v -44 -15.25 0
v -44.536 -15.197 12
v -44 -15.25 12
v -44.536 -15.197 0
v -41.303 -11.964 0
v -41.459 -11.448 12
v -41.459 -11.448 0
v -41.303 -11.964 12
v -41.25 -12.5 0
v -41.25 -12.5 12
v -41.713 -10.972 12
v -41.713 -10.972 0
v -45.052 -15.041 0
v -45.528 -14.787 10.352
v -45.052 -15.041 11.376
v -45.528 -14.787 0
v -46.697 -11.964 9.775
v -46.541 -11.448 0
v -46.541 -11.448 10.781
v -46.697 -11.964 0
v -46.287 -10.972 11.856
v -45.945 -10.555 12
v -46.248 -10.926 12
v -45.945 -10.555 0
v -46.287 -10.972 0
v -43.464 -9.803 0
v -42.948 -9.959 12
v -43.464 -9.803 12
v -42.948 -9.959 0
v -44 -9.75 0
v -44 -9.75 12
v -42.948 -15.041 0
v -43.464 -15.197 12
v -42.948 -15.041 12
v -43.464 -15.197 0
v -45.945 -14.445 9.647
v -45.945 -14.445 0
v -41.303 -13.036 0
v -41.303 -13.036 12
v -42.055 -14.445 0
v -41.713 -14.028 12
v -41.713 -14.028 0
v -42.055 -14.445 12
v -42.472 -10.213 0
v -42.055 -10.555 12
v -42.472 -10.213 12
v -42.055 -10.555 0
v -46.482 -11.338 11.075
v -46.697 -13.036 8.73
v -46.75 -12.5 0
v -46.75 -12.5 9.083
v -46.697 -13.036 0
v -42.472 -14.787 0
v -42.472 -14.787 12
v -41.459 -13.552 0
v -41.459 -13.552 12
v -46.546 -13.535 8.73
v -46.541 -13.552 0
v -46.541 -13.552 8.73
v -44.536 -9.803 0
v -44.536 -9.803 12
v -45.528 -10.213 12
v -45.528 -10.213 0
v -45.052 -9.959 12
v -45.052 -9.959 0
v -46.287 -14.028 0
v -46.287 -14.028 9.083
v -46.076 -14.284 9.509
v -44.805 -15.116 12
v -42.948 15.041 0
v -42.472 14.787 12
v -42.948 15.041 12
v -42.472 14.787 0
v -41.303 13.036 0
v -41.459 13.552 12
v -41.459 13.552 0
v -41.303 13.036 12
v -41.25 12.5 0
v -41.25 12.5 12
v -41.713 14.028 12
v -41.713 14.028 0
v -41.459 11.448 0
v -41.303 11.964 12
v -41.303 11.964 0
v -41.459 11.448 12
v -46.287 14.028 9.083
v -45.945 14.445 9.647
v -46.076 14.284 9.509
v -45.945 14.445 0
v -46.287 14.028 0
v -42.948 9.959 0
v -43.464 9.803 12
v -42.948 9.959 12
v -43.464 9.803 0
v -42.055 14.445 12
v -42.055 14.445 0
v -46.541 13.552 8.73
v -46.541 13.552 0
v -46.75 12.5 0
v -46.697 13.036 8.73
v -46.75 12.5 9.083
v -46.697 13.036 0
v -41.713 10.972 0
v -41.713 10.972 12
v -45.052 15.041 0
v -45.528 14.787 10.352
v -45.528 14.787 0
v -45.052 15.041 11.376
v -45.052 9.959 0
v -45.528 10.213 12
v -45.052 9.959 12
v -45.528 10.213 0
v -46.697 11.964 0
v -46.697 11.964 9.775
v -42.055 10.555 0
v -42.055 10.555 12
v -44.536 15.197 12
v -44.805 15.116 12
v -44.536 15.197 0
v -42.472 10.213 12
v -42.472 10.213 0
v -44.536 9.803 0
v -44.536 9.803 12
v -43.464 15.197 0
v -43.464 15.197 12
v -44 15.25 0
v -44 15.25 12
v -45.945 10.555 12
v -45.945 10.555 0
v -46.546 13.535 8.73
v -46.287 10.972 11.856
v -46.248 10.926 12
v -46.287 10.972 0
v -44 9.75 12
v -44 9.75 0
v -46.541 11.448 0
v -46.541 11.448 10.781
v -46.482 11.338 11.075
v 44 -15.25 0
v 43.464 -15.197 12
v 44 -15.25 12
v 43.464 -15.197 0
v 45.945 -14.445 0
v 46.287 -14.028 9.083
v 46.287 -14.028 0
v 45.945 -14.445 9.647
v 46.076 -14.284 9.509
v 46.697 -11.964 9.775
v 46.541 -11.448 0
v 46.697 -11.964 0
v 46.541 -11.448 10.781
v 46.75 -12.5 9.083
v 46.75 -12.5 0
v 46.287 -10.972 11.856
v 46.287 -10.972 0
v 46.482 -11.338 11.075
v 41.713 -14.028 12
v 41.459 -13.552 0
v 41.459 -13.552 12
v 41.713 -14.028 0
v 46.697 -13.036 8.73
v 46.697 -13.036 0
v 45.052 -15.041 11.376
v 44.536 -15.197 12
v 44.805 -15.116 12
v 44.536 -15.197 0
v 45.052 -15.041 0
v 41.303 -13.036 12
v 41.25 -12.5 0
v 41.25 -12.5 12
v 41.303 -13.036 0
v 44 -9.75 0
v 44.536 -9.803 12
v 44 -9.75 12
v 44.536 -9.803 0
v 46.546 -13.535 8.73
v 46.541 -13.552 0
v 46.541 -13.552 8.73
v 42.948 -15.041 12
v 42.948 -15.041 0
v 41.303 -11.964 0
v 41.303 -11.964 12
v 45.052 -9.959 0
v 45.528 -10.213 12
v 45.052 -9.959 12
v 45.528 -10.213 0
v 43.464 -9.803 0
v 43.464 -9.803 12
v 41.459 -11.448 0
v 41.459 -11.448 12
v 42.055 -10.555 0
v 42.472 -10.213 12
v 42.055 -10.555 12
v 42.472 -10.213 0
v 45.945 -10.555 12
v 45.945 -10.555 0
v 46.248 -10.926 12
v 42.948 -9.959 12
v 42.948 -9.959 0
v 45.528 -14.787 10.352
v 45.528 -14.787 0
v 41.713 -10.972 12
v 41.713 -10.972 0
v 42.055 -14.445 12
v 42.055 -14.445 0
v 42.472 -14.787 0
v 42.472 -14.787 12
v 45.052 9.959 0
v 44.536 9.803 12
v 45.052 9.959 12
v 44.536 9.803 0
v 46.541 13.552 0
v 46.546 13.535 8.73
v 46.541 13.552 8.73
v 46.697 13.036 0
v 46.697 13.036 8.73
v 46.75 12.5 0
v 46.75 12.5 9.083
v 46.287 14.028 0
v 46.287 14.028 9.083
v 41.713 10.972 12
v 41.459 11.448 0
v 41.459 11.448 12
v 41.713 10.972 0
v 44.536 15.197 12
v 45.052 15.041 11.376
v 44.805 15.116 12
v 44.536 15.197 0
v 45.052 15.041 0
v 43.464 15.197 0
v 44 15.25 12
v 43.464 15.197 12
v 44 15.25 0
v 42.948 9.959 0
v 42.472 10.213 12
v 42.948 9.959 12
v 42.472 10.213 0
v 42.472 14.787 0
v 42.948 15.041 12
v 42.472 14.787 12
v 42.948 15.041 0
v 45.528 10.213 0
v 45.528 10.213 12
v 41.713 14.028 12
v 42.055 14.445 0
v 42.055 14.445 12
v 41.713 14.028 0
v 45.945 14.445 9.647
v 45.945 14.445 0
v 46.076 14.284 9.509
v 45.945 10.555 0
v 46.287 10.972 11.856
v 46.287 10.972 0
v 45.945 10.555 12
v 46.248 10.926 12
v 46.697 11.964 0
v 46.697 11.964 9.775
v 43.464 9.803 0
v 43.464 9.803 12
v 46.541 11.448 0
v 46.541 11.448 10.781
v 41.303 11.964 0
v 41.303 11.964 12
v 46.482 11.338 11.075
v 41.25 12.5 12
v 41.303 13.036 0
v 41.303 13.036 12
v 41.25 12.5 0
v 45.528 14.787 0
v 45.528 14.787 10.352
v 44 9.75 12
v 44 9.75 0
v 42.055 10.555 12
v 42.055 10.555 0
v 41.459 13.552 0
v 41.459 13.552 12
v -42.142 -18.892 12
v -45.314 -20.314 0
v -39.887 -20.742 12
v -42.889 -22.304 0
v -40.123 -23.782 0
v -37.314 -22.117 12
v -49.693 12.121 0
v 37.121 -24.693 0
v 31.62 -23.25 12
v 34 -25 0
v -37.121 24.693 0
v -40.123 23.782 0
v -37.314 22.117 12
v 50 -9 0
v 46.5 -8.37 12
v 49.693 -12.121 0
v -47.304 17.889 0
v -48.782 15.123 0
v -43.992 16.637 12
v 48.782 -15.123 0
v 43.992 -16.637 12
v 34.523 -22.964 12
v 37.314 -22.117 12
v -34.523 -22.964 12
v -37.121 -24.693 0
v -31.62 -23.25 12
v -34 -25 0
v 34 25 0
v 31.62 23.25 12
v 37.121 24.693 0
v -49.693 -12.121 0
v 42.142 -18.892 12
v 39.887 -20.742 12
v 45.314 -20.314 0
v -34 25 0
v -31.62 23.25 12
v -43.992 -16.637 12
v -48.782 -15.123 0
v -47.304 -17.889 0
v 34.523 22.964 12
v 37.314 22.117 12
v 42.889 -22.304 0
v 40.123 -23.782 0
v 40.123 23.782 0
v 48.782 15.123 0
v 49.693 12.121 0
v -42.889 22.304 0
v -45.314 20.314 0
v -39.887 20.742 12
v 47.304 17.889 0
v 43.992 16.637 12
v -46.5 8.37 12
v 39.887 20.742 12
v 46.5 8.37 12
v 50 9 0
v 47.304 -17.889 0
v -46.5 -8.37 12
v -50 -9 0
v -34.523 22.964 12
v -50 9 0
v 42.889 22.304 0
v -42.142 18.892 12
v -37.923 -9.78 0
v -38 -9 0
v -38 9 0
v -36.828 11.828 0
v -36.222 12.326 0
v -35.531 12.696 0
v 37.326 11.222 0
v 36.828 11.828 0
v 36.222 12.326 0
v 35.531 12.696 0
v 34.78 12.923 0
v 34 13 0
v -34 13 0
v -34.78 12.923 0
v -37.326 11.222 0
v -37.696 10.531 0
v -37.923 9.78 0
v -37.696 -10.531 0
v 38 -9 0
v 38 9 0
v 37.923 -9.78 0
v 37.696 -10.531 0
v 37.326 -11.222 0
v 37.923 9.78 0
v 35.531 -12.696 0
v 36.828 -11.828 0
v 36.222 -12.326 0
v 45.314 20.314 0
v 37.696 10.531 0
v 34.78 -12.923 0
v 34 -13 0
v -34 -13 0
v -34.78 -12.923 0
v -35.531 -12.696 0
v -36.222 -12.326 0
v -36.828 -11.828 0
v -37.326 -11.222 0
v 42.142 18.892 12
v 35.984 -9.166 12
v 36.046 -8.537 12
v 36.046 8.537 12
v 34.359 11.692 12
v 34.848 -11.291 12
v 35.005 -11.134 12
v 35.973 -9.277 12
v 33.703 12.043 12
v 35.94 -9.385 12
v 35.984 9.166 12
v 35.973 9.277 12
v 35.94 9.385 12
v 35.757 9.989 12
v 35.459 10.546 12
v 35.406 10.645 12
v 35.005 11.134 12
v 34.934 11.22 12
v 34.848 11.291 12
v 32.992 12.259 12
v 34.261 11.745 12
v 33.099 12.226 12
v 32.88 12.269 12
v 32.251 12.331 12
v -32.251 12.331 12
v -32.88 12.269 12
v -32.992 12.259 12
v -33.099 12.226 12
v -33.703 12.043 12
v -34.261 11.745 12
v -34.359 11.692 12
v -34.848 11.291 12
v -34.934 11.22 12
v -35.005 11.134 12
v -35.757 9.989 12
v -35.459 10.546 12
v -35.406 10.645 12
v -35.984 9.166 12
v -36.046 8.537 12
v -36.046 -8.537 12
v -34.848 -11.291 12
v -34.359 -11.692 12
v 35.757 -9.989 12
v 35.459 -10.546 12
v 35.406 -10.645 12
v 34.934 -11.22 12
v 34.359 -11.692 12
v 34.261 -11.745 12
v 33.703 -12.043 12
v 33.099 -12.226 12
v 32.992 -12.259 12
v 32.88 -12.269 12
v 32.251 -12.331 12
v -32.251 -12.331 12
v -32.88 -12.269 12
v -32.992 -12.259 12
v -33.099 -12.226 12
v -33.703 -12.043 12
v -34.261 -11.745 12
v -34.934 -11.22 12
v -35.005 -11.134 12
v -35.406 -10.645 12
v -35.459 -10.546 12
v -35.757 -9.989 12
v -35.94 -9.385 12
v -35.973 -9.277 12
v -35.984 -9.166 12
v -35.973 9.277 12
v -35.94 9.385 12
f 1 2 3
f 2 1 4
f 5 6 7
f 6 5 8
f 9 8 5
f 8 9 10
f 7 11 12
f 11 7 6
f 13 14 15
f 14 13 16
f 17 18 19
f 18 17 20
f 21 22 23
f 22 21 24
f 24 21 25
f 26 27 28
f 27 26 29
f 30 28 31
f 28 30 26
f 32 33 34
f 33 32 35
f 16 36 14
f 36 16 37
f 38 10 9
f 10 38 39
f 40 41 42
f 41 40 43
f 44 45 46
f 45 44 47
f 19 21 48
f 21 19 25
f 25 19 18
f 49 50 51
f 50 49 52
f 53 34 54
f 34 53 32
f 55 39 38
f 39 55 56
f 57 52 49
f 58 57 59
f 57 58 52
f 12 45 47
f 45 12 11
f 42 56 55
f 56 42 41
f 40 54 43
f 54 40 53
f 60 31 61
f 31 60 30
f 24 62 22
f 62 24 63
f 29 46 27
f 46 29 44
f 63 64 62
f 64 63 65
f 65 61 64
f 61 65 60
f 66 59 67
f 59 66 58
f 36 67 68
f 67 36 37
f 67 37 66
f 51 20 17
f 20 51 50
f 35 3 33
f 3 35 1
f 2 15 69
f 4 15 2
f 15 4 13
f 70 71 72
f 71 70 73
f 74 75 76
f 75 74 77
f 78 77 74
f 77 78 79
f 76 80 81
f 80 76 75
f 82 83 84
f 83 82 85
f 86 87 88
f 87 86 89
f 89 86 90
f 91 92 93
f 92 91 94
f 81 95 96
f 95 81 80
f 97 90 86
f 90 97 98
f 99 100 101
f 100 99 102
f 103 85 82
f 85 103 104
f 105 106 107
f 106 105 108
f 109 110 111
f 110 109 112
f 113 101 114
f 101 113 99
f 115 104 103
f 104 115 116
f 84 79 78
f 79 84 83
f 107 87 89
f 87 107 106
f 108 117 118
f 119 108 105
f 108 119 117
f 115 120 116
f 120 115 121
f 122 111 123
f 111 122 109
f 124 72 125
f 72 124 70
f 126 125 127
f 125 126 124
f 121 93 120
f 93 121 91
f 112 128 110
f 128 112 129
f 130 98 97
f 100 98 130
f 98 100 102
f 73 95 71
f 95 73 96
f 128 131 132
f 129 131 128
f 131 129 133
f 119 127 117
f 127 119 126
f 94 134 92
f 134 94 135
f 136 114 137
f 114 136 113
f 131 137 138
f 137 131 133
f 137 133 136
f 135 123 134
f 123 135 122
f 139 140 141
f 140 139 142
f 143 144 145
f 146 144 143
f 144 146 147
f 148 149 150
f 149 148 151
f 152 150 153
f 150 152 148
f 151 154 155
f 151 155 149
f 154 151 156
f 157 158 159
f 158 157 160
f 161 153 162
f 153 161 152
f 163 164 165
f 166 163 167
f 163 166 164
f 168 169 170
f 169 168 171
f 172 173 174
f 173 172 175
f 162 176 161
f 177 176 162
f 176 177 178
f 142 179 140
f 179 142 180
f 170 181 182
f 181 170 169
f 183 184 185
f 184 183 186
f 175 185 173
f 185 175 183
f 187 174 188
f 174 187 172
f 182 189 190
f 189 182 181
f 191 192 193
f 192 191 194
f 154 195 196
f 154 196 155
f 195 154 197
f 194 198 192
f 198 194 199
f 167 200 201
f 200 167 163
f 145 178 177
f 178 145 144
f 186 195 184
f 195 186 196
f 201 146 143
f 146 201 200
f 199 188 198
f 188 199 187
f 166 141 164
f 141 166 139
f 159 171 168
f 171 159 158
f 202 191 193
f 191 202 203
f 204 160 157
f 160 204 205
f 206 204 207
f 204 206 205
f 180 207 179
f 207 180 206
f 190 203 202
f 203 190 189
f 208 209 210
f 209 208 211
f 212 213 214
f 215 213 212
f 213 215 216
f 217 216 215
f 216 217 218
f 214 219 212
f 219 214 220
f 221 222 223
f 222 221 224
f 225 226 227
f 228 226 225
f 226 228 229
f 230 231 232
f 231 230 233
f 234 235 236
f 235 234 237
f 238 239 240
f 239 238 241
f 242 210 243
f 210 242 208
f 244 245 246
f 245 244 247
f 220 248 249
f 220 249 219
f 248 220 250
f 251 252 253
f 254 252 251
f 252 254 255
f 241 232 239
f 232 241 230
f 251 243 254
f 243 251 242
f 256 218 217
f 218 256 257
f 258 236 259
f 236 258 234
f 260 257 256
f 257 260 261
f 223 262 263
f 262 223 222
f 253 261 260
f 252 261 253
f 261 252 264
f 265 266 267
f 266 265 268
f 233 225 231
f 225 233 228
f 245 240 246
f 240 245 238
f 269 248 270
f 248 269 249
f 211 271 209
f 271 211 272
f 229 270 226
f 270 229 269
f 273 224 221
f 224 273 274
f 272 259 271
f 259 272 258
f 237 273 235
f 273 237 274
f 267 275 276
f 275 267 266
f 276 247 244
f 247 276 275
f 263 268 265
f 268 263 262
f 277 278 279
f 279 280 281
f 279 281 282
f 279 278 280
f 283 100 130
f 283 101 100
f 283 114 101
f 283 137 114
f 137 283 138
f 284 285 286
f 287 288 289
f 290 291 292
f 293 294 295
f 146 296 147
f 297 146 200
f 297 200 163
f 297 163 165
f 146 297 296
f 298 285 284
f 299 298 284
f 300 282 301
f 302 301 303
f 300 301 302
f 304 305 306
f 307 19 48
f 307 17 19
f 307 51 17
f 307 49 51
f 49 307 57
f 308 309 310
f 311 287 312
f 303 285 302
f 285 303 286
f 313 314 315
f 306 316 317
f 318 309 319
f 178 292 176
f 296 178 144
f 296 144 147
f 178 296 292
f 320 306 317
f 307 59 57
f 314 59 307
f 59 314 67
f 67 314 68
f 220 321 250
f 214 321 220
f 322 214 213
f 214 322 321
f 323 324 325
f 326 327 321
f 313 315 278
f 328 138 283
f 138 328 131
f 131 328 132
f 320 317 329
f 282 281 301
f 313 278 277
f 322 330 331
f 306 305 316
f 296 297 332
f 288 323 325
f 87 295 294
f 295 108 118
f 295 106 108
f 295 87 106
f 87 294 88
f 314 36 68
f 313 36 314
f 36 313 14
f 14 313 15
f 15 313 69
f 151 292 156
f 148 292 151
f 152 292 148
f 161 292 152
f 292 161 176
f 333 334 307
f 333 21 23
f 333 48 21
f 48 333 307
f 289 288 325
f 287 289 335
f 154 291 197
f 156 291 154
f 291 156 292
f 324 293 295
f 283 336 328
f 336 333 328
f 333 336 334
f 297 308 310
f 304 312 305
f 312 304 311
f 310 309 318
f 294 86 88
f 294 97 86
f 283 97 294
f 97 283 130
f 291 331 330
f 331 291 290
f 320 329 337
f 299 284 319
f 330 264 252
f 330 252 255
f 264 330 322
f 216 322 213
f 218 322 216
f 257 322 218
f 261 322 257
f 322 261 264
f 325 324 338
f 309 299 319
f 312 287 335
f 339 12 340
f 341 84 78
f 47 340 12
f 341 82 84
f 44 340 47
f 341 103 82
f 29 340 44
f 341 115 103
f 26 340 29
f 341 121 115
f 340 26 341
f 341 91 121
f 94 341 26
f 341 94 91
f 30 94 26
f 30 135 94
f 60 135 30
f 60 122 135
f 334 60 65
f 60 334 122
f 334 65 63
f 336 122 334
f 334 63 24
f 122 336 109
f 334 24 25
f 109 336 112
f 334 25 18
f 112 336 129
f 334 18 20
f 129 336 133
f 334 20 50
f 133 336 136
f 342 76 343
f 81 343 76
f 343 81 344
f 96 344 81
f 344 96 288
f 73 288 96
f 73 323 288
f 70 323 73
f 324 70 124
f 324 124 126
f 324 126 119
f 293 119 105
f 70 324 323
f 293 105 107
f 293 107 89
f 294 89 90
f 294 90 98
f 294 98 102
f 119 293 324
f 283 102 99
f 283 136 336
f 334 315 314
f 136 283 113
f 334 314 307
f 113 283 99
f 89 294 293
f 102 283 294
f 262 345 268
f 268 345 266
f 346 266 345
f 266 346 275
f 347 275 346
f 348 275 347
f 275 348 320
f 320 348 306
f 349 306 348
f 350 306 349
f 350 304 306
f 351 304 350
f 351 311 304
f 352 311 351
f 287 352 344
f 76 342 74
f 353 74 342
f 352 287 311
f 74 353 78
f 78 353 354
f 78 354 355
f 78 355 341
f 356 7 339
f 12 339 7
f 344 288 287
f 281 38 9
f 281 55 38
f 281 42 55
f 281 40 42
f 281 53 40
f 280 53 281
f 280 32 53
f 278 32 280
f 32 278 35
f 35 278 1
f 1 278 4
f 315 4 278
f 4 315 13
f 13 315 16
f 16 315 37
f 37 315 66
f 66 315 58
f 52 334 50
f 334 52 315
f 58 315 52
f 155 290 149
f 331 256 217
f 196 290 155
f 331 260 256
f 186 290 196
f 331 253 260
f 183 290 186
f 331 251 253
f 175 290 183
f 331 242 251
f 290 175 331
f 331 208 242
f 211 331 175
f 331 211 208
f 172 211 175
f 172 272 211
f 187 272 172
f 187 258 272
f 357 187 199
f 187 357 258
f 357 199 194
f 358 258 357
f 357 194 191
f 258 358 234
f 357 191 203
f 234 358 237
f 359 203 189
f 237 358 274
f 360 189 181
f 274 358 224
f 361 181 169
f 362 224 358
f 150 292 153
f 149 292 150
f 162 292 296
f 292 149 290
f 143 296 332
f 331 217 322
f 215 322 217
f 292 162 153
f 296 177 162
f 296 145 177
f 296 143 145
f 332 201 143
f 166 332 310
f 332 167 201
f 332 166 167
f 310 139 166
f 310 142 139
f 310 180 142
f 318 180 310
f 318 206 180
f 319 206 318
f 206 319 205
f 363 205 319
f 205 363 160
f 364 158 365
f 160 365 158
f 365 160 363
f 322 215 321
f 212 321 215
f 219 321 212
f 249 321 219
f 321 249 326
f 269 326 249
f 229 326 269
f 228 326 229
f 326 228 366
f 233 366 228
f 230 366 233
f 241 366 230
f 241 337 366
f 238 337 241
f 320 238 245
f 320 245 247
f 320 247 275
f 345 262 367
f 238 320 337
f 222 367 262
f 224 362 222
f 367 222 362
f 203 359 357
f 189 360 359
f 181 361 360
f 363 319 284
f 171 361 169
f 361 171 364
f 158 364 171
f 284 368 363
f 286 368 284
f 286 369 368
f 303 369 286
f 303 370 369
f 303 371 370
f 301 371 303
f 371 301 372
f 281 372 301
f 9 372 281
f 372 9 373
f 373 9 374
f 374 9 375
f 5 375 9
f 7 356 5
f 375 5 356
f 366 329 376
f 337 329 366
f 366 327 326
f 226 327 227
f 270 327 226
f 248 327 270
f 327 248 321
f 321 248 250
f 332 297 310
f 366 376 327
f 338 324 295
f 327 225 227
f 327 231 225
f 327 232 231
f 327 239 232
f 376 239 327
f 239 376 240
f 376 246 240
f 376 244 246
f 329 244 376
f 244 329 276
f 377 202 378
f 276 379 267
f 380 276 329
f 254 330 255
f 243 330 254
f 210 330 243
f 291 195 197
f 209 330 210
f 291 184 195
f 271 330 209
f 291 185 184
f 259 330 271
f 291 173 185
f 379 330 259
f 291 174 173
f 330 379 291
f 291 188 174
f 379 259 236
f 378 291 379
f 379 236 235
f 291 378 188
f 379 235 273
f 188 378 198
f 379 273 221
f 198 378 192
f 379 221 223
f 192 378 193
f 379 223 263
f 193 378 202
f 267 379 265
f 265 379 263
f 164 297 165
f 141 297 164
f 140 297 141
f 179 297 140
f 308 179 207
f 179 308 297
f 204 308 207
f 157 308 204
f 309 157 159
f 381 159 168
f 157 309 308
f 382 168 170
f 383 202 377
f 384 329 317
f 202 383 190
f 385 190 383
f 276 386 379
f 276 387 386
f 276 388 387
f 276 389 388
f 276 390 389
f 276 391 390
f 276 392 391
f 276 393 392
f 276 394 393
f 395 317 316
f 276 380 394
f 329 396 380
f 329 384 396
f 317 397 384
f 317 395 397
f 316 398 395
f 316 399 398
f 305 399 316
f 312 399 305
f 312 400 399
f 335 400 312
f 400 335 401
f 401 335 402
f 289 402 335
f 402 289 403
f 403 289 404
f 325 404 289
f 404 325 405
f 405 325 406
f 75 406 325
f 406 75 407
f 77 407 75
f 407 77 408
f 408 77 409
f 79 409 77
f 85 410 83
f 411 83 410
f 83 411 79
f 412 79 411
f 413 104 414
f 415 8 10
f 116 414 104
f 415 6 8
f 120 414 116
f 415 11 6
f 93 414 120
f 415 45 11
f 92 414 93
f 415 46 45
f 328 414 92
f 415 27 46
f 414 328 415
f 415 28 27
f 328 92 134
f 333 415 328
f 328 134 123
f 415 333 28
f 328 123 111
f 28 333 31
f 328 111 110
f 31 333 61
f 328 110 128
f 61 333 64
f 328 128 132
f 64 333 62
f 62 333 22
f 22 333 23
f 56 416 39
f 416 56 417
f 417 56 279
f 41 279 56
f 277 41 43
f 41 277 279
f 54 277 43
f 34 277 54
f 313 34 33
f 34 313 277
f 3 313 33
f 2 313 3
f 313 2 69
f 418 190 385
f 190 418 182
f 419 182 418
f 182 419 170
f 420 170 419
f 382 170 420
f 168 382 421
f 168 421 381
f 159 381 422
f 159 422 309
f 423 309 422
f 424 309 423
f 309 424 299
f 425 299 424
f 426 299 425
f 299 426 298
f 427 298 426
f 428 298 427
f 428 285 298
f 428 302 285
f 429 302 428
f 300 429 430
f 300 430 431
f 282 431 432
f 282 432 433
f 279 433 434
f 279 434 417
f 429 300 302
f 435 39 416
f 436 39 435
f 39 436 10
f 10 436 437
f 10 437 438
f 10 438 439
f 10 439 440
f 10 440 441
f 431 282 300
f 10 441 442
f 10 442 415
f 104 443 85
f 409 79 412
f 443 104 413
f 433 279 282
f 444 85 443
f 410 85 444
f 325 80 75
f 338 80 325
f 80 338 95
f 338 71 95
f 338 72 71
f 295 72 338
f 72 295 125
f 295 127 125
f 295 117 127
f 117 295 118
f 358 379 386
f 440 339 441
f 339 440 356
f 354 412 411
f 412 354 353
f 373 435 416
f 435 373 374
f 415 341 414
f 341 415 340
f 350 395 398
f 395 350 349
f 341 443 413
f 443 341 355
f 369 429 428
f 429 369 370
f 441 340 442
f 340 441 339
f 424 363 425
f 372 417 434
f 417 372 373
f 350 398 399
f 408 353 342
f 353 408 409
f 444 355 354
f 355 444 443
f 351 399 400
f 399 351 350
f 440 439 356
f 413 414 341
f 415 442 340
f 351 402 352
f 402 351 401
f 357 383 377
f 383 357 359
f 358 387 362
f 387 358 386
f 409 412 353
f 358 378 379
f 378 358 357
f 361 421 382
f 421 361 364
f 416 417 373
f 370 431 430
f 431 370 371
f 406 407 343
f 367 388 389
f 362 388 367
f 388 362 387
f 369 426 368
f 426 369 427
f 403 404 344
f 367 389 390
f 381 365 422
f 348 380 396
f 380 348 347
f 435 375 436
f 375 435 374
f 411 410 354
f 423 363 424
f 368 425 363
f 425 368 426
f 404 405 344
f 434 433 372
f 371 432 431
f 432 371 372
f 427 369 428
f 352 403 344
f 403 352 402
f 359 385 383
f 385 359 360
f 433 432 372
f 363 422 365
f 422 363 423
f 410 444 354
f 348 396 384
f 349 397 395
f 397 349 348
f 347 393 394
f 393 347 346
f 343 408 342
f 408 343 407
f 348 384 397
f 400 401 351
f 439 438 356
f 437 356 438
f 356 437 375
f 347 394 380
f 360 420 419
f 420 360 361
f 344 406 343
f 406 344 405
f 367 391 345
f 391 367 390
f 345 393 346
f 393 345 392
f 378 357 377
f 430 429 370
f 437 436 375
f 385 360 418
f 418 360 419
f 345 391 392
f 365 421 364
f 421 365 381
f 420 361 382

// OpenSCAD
$fn = 32;

// ----------------------------------------------------------------------
// Display bezel: 100 x 50 mm frame, opening 76x26 mm
// ----------------------------------------------------------------------

// --- parameters (mm) ---
length = 100;             // frame outside length, X
width = 50;               // frame outside width, Y
frame_w = 12;             // frame width
thickness = 12;           // frame thickness
corner_r = 16;            // outside corner radius
chamfer = 0.93;           // outer wall taper
funnel = 0.94;            // inner opening taper
opening_l = 76;           // opening length
opening_w = 26;           // opening width
inner_r = 4;              // opening corner radius
hole_d = 5.5;             // mounting screw clearance
holes_per_side = 2;       // holes per short side
hole_inset = 6;           // hole centre inset from the outside edge

/* rounded-rectangle outlines, generated with loops */
module rounded_ring(l_nom, w_nom, r) {
  hull() {
    for (sx = [-1, 1]) for (sy = [-1, 1])
      translate([sx * (l_nom / 2 - r), sy * (w_nom / 2 - r)]) circle(r = r);
  }
}

difference() {
  /* frame body, drafted so the outer edge is a variable-depth chamfer */
  linear_extrude(height = thickness, scale = chamfer)
    rounded_ring(length, width, corner_r);
  /* viewing opening, drafted the other way for a funnel edge */
  linear_extrude(height = thickness + 2, scale = funnel)
    translate([0, 0, -1]) rounded_ring(opening_l, opening_w, inner_r);
  /* mounting screws through the frame lands */
  for (sx = [-1, 1]) for (i = [1 : holes_per_side])
    translate([sx * (length / 2 - hole_inset),
               (i - (holes_per_side + 1) / 2) * width * 0.5, -1])
      cylinder(h = thickness + 2, d = hole_d);
}
